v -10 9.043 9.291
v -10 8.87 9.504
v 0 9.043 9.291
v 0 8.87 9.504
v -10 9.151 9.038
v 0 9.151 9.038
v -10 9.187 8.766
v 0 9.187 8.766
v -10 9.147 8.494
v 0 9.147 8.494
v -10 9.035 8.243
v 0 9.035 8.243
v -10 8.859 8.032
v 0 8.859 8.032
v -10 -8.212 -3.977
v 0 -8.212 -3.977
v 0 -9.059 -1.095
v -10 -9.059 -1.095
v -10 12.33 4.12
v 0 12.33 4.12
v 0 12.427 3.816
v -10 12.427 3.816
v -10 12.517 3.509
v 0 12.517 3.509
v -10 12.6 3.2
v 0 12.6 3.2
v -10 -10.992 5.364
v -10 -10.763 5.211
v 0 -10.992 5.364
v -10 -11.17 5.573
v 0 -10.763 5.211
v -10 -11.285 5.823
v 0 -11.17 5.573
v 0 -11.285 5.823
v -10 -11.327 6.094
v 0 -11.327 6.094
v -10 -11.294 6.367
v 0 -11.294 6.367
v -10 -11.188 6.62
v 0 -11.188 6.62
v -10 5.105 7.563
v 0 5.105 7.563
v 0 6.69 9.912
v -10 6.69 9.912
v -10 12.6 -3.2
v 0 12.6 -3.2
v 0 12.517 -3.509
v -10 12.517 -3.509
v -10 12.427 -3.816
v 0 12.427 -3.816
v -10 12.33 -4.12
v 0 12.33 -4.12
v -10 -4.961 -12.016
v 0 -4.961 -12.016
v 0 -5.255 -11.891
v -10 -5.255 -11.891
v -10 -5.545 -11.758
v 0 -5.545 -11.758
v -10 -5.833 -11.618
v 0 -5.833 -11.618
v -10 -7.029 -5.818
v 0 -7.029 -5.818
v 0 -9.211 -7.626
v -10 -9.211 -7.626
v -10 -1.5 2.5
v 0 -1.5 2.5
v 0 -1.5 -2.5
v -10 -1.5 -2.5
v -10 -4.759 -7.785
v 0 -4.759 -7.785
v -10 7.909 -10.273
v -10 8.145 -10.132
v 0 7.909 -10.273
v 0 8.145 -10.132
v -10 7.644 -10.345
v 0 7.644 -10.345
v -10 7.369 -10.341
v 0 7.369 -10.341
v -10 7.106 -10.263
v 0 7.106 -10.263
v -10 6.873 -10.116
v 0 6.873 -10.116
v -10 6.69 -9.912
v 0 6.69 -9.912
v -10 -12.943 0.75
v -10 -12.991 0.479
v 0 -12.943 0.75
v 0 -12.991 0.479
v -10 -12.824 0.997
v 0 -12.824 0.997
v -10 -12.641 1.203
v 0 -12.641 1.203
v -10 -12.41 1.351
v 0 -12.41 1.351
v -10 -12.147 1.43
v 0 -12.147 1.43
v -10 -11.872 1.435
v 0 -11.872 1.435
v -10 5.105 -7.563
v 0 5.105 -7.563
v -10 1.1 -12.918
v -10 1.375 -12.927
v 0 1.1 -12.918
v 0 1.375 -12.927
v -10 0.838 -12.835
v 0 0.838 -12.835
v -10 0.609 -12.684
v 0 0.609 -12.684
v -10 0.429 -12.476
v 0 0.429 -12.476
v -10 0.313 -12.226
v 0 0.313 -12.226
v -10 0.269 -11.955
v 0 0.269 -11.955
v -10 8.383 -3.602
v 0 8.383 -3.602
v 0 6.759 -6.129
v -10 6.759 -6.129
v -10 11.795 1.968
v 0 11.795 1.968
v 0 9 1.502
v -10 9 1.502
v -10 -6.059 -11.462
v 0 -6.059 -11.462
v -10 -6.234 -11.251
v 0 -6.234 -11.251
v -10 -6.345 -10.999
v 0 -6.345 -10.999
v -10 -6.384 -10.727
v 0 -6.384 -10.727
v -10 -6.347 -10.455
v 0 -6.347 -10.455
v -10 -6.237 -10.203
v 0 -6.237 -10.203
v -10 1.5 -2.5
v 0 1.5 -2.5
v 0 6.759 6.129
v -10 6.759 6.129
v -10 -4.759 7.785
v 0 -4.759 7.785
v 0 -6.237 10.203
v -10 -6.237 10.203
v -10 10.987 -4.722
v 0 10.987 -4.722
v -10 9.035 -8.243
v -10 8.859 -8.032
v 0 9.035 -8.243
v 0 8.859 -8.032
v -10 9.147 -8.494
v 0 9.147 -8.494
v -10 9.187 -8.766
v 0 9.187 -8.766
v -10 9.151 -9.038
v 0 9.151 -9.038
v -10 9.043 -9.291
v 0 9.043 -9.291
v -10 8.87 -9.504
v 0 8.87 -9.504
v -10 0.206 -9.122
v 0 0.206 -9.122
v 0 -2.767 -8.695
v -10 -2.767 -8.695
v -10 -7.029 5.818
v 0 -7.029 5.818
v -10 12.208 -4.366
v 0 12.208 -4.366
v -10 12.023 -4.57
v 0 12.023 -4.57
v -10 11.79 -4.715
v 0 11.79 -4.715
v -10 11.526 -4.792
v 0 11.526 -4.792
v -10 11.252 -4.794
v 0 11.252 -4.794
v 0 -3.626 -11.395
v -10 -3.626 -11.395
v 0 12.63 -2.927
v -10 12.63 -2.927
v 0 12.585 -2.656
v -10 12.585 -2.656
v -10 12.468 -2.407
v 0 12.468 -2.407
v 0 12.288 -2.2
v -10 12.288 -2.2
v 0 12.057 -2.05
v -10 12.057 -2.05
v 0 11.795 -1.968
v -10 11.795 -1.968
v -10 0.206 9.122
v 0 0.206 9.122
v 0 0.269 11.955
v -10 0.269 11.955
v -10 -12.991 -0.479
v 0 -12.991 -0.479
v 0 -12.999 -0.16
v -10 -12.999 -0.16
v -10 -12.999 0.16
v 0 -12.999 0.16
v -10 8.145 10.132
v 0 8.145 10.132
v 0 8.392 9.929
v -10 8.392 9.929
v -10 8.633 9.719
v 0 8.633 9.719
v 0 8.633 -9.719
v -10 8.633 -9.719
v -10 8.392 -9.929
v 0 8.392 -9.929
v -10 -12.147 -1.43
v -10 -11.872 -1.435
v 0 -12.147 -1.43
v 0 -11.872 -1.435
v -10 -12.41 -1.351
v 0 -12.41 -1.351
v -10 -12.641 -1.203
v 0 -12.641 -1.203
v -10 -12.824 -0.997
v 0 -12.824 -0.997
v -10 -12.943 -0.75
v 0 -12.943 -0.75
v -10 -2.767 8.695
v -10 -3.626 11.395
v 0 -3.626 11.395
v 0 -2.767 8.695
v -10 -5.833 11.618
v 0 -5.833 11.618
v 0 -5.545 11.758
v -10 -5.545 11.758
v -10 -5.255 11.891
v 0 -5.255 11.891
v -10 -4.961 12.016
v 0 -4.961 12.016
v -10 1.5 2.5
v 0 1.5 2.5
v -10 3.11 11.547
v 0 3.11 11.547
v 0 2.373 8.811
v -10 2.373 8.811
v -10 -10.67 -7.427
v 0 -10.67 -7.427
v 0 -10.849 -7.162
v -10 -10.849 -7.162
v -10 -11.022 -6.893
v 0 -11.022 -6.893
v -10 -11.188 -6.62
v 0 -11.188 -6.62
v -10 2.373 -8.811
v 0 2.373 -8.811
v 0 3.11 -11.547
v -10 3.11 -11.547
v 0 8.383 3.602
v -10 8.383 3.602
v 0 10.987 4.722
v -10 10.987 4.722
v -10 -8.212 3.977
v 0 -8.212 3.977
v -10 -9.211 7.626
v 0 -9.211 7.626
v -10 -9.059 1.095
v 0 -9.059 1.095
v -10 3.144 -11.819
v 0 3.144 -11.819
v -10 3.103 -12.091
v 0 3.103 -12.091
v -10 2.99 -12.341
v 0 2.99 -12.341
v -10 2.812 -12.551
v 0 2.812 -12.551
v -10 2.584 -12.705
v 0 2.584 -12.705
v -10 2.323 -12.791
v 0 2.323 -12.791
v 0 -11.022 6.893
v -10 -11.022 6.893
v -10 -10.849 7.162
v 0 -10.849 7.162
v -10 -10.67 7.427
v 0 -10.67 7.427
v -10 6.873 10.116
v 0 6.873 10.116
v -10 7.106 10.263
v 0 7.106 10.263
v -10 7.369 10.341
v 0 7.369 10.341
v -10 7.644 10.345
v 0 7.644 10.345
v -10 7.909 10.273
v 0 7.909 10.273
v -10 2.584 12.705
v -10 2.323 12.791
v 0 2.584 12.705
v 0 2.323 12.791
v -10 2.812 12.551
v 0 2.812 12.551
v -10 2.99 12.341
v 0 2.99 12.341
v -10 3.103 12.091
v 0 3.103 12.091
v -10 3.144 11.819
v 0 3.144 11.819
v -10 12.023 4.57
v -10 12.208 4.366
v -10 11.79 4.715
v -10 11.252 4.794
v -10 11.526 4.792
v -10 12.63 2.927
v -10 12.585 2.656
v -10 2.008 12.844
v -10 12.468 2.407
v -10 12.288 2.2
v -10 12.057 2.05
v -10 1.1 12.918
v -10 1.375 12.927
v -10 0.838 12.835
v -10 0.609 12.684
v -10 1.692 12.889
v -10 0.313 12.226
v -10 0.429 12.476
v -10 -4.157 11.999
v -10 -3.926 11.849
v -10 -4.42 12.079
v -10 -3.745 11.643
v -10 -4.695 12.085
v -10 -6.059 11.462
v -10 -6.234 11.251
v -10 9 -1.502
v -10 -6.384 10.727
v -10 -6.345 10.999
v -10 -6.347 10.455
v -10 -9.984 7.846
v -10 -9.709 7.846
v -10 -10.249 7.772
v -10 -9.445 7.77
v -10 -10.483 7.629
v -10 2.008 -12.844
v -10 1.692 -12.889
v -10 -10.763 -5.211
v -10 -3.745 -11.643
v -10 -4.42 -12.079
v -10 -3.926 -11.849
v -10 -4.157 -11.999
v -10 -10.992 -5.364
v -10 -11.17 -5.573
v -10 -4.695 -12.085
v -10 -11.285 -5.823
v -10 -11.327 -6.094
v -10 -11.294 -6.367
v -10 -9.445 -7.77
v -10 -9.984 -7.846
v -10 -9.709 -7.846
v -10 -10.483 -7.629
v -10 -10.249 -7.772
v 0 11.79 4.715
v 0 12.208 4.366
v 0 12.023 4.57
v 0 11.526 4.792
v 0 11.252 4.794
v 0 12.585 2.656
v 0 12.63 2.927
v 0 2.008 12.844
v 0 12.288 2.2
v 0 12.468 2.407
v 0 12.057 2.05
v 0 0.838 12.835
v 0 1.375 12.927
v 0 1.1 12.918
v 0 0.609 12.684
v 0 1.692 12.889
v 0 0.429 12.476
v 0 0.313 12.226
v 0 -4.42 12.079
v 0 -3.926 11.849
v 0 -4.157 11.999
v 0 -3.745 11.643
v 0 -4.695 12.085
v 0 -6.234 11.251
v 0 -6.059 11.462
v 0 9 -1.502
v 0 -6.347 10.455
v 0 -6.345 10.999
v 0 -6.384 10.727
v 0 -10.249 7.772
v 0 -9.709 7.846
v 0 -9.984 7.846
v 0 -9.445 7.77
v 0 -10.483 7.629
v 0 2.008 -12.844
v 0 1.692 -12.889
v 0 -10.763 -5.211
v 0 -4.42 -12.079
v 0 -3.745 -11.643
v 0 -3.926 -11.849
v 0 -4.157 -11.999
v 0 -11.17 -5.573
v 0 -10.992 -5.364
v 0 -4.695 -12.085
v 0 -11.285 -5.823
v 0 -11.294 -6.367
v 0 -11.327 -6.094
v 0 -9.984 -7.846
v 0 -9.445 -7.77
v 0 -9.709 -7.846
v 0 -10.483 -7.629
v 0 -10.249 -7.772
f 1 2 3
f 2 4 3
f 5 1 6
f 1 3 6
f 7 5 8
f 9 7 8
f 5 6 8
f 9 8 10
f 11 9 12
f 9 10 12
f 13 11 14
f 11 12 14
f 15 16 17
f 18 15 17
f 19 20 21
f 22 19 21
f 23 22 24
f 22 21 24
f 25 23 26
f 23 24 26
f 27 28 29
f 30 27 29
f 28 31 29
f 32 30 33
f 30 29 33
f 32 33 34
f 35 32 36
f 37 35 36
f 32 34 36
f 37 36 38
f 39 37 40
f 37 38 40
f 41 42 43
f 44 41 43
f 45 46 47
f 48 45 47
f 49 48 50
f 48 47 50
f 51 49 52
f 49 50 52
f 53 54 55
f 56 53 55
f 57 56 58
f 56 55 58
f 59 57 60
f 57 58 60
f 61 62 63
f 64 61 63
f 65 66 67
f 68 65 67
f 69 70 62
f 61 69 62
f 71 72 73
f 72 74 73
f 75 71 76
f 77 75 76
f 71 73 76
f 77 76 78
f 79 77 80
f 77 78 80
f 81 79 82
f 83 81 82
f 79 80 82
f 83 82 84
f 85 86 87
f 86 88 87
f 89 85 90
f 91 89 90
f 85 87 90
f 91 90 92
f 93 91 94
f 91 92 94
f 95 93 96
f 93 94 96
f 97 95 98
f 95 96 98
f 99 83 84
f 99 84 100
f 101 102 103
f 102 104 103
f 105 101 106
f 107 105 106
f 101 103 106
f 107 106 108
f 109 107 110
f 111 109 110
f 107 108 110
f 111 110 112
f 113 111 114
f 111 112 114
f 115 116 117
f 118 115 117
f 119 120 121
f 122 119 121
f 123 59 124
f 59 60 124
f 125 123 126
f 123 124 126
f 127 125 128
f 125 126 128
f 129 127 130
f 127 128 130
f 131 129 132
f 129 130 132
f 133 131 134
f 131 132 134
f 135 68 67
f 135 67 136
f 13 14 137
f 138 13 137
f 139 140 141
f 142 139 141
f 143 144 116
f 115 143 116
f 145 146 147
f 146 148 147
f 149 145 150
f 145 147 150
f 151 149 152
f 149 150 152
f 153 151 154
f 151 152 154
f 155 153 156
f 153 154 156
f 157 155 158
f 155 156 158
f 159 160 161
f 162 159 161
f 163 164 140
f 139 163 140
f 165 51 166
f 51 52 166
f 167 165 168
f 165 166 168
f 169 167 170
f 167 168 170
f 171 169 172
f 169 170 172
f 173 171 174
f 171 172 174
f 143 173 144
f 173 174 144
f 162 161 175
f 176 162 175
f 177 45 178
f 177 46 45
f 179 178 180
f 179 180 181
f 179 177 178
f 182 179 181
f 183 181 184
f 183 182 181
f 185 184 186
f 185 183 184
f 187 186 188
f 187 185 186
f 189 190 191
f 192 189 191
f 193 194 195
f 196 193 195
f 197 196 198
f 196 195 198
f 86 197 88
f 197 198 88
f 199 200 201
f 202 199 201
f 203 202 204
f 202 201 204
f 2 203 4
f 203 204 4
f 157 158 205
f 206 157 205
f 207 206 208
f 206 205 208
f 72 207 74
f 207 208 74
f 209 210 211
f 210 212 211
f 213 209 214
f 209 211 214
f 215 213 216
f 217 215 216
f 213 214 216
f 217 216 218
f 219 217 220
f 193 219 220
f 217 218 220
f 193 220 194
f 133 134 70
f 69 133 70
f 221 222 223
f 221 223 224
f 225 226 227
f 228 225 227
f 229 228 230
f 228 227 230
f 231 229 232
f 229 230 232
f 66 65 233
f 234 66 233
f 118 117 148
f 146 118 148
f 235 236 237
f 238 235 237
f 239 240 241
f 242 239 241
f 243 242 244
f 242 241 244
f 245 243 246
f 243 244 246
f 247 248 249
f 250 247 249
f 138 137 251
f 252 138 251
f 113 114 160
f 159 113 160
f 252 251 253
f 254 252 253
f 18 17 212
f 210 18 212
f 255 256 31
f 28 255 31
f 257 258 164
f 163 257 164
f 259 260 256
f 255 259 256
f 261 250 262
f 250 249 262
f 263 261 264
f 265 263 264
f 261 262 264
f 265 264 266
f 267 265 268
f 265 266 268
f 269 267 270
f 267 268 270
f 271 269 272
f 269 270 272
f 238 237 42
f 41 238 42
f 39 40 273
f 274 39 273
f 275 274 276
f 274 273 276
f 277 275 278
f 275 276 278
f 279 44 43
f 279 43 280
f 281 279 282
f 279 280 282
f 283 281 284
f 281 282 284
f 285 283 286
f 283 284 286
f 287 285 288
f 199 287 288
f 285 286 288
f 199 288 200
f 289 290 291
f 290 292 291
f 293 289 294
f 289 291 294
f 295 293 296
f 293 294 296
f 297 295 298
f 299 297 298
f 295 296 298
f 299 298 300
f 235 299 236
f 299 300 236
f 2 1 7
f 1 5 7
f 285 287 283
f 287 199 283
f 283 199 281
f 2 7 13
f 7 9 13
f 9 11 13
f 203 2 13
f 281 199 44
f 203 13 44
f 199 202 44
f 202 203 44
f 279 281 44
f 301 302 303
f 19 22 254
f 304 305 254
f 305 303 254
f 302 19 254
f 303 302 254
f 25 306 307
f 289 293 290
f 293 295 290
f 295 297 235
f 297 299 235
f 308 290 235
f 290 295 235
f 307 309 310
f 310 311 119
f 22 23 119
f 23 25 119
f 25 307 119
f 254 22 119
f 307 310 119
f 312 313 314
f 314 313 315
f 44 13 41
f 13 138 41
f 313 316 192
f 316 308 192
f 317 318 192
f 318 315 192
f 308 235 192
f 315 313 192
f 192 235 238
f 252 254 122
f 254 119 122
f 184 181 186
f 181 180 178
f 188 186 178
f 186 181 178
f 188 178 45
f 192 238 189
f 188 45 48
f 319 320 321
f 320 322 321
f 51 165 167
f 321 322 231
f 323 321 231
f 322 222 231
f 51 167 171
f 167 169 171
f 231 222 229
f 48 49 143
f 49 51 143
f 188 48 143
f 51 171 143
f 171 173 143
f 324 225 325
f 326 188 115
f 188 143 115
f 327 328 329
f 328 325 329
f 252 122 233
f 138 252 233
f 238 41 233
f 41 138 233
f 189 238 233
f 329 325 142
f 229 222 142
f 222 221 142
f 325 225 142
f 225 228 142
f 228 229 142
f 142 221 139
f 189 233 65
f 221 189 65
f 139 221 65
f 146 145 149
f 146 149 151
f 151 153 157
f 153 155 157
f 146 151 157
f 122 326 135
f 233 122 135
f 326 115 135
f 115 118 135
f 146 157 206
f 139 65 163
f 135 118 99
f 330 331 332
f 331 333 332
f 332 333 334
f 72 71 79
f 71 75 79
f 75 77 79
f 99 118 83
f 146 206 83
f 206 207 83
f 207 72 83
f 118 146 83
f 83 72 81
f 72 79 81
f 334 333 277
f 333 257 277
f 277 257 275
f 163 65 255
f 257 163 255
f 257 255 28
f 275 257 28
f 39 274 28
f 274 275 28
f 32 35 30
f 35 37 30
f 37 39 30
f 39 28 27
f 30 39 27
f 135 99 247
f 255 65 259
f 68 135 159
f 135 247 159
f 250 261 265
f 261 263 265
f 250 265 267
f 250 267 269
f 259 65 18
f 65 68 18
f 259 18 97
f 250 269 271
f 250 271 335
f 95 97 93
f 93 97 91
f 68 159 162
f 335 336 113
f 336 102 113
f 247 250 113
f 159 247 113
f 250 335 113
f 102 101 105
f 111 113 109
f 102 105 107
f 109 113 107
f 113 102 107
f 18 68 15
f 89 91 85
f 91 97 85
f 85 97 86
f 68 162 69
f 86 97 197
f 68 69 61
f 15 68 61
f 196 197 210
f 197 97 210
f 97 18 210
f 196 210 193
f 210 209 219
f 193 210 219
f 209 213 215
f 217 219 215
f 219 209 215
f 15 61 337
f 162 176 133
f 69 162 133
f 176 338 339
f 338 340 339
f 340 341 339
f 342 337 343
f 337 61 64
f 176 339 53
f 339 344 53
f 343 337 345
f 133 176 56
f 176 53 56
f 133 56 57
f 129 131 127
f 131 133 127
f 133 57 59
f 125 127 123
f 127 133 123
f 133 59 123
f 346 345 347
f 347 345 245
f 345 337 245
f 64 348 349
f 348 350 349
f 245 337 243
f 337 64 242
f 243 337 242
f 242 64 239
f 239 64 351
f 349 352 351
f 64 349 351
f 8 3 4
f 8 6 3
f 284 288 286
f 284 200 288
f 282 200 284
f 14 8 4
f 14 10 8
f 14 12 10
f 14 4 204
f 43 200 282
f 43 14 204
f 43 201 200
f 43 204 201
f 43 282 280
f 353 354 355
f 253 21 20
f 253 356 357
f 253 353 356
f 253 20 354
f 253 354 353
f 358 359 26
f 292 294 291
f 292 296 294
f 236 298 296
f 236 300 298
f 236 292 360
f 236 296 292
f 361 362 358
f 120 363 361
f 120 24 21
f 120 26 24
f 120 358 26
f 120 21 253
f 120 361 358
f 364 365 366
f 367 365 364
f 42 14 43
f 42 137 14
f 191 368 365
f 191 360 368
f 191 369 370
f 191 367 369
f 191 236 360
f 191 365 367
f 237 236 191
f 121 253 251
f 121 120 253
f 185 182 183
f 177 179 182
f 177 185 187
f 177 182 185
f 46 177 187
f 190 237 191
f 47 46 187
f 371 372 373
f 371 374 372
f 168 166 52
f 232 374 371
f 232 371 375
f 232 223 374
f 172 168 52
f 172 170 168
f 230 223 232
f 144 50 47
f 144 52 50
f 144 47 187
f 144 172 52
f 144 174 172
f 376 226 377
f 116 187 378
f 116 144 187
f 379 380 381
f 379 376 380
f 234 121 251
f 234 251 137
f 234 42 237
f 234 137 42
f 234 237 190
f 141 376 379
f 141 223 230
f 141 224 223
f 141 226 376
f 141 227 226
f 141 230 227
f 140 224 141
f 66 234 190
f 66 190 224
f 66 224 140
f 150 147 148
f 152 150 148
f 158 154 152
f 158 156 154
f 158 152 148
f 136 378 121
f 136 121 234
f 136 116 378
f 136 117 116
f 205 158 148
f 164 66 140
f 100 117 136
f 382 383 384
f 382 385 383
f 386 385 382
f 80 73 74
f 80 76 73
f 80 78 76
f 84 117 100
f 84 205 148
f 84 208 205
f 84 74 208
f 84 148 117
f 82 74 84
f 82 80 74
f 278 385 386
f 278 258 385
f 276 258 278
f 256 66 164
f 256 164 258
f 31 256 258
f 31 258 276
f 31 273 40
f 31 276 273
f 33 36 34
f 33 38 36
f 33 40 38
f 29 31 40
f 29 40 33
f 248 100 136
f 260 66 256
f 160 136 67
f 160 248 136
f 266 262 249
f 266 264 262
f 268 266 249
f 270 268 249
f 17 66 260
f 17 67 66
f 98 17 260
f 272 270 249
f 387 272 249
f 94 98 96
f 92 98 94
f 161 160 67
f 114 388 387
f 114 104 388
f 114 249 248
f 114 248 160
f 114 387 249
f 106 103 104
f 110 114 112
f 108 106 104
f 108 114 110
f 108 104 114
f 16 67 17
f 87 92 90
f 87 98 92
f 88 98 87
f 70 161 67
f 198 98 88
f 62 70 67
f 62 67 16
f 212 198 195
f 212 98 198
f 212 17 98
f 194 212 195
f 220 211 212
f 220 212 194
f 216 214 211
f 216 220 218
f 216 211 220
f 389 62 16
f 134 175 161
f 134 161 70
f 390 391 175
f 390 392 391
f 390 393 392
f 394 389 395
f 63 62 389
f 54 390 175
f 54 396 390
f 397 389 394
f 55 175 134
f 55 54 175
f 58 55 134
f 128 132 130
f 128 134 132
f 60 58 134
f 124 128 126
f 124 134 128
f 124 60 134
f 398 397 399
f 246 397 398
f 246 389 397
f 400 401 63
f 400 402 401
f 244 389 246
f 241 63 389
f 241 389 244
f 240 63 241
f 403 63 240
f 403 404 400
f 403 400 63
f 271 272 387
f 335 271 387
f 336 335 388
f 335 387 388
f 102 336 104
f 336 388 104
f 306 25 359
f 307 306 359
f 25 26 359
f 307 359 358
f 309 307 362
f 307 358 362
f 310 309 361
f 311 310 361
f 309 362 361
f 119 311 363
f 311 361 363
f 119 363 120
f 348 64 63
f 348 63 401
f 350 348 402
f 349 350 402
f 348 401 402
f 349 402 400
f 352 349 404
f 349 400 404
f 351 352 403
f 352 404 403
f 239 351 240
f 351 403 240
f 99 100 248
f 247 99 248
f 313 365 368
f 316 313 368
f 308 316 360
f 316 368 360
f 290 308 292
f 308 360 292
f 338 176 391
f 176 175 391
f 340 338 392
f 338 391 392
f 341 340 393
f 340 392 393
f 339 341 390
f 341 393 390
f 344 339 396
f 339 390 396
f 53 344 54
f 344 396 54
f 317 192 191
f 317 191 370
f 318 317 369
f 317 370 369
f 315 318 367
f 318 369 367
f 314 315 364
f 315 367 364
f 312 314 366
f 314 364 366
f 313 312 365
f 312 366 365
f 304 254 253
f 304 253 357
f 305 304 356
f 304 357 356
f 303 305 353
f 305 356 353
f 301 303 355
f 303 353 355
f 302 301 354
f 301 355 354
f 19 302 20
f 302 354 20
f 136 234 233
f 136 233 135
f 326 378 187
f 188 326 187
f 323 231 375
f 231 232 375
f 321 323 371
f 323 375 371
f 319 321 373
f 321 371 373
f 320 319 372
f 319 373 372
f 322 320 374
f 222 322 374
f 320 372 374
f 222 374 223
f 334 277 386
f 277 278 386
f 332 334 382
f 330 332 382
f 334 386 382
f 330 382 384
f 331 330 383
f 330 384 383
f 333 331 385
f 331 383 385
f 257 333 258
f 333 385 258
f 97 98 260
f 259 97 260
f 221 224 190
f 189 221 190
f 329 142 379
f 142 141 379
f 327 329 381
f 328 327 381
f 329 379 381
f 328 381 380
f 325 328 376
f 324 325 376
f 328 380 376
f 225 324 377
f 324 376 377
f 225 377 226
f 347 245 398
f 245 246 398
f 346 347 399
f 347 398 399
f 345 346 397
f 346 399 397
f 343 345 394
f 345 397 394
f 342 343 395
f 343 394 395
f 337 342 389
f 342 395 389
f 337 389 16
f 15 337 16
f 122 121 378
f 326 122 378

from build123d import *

# Parameters (mm, degrees)
SKETCH1_W                = 10
SKETCH1_H                = 13
CUT_EXTRUDE1_DEPTH       = 10
SKETCH7_W                = 5
SKETCH7_H                = 3
CUT_EXTRUDE2_DEPTH       = 10
FILLET1_R                = 1
CIRPATTERN1_COUNT        = 11
FILLET1_OF_CIRPATTERN1_R = 1


with BuildPart() as part:
    # Sketch1 → Revolve1 (revolve)
    with BuildSketch(Plane.XY):
        with Locations((-5, 6.5)):
            Rectangle(SKETCH1_W, SKETCH1_H)
    revolve(axis=Axis((-10, 0, 0), (-1, 0, 0)))

    # Sketch6 → Cut-Extrude1 (cut)
    with BuildSketch(Plane(origin=(0, 0, 0), x_dir=(0, 0, -1), z_dir=(1, 0, 0))):
        Polygon((-1.501758676, 9), (1.501758676, 9), (2.502016427, 15), (-2.502016427, 15), align=None)
    cut_extrude1 = extrude(amount=-CUT_EXTRUDE1_DEPTH, mode=Mode.SUBTRACT)

    # Sketch7 → Cut-Extrude2 (cut)
    with BuildSketch(Plane(origin=(0, 0, 0), x_dir=(0, 0, -1), z_dir=(1, 0, 0))):
        Rectangle(SKETCH7_W, SKETCH7_H)
    extrude(amount=-CUT_EXTRUDE2_DEPTH, mode=Mode.SUBTRACT)

    # Fillet1
    fillet1_edges = [part.edges().sort_by_distance(p)[0] for p in [
        (-5, 12.822809052, 2.13905774),
        (-5, 12.822809052, -2.13905774),
    ]]
    fillet(fillet1_edges, radius=FILLET1_R)

    # CirPattern1: Cut-Extrude1 ×11 about axis
    cirpattern1_axis = Axis((0, 0, 0), (1, 0, 0))
    for i in range(1, CIRPATTERN1_COUNT):
        add(cut_extrude1.rotate(cirpattern1_axis, i * 360 / CIRPATTERN1_COUNT), mode=Mode.SUBTRACT)

    # Fillet1 of CirPattern1
    fillet1_of_cirpattern1_edges = [part.edges().sort_by_distance(p)[0] for p in [
        (-5, 9.630771491, 8.732023849),
        (-5, 11.943695341, 5.133044087),
        (-5, 3.381032029, 12.552634083),
        (-5, 7.27254275, 10.775440685),
        (-5, -3.942161213, 12.387871688),
        (-5, 0.29240922, 12.996711001),
        (-5, -10.013746124, 8.290047561),
        (-5, -6.78056217, 11.091617405),
        (-5, -12.906037394, 1.560191908),
        (-5, -11.700752981, 5.665013652),
        (-5, -11.700752981, -5.665013652),
        (-5, -12.906037394, -1.560191908),
        (-5, -6.78056217, -11.091617405),
        (-5, -10.013746124, -8.290047561),
        (-5, 0.29240922, -12.996711001),
        (-5, -3.942161213, -12.387871688),
        (-5, 7.27254275, -10.775440685),
        (-5, 3.381032029, -12.552634083),
        (-5, 11.943695341, -5.133044087),
        (-5, 9.630771491, -8.732023849),
    ]]
    fillet(fillet1_of_cirpattern1_edges, radius=FILLET1_OF_CIRPATTERN1_R)


solid = part.part
